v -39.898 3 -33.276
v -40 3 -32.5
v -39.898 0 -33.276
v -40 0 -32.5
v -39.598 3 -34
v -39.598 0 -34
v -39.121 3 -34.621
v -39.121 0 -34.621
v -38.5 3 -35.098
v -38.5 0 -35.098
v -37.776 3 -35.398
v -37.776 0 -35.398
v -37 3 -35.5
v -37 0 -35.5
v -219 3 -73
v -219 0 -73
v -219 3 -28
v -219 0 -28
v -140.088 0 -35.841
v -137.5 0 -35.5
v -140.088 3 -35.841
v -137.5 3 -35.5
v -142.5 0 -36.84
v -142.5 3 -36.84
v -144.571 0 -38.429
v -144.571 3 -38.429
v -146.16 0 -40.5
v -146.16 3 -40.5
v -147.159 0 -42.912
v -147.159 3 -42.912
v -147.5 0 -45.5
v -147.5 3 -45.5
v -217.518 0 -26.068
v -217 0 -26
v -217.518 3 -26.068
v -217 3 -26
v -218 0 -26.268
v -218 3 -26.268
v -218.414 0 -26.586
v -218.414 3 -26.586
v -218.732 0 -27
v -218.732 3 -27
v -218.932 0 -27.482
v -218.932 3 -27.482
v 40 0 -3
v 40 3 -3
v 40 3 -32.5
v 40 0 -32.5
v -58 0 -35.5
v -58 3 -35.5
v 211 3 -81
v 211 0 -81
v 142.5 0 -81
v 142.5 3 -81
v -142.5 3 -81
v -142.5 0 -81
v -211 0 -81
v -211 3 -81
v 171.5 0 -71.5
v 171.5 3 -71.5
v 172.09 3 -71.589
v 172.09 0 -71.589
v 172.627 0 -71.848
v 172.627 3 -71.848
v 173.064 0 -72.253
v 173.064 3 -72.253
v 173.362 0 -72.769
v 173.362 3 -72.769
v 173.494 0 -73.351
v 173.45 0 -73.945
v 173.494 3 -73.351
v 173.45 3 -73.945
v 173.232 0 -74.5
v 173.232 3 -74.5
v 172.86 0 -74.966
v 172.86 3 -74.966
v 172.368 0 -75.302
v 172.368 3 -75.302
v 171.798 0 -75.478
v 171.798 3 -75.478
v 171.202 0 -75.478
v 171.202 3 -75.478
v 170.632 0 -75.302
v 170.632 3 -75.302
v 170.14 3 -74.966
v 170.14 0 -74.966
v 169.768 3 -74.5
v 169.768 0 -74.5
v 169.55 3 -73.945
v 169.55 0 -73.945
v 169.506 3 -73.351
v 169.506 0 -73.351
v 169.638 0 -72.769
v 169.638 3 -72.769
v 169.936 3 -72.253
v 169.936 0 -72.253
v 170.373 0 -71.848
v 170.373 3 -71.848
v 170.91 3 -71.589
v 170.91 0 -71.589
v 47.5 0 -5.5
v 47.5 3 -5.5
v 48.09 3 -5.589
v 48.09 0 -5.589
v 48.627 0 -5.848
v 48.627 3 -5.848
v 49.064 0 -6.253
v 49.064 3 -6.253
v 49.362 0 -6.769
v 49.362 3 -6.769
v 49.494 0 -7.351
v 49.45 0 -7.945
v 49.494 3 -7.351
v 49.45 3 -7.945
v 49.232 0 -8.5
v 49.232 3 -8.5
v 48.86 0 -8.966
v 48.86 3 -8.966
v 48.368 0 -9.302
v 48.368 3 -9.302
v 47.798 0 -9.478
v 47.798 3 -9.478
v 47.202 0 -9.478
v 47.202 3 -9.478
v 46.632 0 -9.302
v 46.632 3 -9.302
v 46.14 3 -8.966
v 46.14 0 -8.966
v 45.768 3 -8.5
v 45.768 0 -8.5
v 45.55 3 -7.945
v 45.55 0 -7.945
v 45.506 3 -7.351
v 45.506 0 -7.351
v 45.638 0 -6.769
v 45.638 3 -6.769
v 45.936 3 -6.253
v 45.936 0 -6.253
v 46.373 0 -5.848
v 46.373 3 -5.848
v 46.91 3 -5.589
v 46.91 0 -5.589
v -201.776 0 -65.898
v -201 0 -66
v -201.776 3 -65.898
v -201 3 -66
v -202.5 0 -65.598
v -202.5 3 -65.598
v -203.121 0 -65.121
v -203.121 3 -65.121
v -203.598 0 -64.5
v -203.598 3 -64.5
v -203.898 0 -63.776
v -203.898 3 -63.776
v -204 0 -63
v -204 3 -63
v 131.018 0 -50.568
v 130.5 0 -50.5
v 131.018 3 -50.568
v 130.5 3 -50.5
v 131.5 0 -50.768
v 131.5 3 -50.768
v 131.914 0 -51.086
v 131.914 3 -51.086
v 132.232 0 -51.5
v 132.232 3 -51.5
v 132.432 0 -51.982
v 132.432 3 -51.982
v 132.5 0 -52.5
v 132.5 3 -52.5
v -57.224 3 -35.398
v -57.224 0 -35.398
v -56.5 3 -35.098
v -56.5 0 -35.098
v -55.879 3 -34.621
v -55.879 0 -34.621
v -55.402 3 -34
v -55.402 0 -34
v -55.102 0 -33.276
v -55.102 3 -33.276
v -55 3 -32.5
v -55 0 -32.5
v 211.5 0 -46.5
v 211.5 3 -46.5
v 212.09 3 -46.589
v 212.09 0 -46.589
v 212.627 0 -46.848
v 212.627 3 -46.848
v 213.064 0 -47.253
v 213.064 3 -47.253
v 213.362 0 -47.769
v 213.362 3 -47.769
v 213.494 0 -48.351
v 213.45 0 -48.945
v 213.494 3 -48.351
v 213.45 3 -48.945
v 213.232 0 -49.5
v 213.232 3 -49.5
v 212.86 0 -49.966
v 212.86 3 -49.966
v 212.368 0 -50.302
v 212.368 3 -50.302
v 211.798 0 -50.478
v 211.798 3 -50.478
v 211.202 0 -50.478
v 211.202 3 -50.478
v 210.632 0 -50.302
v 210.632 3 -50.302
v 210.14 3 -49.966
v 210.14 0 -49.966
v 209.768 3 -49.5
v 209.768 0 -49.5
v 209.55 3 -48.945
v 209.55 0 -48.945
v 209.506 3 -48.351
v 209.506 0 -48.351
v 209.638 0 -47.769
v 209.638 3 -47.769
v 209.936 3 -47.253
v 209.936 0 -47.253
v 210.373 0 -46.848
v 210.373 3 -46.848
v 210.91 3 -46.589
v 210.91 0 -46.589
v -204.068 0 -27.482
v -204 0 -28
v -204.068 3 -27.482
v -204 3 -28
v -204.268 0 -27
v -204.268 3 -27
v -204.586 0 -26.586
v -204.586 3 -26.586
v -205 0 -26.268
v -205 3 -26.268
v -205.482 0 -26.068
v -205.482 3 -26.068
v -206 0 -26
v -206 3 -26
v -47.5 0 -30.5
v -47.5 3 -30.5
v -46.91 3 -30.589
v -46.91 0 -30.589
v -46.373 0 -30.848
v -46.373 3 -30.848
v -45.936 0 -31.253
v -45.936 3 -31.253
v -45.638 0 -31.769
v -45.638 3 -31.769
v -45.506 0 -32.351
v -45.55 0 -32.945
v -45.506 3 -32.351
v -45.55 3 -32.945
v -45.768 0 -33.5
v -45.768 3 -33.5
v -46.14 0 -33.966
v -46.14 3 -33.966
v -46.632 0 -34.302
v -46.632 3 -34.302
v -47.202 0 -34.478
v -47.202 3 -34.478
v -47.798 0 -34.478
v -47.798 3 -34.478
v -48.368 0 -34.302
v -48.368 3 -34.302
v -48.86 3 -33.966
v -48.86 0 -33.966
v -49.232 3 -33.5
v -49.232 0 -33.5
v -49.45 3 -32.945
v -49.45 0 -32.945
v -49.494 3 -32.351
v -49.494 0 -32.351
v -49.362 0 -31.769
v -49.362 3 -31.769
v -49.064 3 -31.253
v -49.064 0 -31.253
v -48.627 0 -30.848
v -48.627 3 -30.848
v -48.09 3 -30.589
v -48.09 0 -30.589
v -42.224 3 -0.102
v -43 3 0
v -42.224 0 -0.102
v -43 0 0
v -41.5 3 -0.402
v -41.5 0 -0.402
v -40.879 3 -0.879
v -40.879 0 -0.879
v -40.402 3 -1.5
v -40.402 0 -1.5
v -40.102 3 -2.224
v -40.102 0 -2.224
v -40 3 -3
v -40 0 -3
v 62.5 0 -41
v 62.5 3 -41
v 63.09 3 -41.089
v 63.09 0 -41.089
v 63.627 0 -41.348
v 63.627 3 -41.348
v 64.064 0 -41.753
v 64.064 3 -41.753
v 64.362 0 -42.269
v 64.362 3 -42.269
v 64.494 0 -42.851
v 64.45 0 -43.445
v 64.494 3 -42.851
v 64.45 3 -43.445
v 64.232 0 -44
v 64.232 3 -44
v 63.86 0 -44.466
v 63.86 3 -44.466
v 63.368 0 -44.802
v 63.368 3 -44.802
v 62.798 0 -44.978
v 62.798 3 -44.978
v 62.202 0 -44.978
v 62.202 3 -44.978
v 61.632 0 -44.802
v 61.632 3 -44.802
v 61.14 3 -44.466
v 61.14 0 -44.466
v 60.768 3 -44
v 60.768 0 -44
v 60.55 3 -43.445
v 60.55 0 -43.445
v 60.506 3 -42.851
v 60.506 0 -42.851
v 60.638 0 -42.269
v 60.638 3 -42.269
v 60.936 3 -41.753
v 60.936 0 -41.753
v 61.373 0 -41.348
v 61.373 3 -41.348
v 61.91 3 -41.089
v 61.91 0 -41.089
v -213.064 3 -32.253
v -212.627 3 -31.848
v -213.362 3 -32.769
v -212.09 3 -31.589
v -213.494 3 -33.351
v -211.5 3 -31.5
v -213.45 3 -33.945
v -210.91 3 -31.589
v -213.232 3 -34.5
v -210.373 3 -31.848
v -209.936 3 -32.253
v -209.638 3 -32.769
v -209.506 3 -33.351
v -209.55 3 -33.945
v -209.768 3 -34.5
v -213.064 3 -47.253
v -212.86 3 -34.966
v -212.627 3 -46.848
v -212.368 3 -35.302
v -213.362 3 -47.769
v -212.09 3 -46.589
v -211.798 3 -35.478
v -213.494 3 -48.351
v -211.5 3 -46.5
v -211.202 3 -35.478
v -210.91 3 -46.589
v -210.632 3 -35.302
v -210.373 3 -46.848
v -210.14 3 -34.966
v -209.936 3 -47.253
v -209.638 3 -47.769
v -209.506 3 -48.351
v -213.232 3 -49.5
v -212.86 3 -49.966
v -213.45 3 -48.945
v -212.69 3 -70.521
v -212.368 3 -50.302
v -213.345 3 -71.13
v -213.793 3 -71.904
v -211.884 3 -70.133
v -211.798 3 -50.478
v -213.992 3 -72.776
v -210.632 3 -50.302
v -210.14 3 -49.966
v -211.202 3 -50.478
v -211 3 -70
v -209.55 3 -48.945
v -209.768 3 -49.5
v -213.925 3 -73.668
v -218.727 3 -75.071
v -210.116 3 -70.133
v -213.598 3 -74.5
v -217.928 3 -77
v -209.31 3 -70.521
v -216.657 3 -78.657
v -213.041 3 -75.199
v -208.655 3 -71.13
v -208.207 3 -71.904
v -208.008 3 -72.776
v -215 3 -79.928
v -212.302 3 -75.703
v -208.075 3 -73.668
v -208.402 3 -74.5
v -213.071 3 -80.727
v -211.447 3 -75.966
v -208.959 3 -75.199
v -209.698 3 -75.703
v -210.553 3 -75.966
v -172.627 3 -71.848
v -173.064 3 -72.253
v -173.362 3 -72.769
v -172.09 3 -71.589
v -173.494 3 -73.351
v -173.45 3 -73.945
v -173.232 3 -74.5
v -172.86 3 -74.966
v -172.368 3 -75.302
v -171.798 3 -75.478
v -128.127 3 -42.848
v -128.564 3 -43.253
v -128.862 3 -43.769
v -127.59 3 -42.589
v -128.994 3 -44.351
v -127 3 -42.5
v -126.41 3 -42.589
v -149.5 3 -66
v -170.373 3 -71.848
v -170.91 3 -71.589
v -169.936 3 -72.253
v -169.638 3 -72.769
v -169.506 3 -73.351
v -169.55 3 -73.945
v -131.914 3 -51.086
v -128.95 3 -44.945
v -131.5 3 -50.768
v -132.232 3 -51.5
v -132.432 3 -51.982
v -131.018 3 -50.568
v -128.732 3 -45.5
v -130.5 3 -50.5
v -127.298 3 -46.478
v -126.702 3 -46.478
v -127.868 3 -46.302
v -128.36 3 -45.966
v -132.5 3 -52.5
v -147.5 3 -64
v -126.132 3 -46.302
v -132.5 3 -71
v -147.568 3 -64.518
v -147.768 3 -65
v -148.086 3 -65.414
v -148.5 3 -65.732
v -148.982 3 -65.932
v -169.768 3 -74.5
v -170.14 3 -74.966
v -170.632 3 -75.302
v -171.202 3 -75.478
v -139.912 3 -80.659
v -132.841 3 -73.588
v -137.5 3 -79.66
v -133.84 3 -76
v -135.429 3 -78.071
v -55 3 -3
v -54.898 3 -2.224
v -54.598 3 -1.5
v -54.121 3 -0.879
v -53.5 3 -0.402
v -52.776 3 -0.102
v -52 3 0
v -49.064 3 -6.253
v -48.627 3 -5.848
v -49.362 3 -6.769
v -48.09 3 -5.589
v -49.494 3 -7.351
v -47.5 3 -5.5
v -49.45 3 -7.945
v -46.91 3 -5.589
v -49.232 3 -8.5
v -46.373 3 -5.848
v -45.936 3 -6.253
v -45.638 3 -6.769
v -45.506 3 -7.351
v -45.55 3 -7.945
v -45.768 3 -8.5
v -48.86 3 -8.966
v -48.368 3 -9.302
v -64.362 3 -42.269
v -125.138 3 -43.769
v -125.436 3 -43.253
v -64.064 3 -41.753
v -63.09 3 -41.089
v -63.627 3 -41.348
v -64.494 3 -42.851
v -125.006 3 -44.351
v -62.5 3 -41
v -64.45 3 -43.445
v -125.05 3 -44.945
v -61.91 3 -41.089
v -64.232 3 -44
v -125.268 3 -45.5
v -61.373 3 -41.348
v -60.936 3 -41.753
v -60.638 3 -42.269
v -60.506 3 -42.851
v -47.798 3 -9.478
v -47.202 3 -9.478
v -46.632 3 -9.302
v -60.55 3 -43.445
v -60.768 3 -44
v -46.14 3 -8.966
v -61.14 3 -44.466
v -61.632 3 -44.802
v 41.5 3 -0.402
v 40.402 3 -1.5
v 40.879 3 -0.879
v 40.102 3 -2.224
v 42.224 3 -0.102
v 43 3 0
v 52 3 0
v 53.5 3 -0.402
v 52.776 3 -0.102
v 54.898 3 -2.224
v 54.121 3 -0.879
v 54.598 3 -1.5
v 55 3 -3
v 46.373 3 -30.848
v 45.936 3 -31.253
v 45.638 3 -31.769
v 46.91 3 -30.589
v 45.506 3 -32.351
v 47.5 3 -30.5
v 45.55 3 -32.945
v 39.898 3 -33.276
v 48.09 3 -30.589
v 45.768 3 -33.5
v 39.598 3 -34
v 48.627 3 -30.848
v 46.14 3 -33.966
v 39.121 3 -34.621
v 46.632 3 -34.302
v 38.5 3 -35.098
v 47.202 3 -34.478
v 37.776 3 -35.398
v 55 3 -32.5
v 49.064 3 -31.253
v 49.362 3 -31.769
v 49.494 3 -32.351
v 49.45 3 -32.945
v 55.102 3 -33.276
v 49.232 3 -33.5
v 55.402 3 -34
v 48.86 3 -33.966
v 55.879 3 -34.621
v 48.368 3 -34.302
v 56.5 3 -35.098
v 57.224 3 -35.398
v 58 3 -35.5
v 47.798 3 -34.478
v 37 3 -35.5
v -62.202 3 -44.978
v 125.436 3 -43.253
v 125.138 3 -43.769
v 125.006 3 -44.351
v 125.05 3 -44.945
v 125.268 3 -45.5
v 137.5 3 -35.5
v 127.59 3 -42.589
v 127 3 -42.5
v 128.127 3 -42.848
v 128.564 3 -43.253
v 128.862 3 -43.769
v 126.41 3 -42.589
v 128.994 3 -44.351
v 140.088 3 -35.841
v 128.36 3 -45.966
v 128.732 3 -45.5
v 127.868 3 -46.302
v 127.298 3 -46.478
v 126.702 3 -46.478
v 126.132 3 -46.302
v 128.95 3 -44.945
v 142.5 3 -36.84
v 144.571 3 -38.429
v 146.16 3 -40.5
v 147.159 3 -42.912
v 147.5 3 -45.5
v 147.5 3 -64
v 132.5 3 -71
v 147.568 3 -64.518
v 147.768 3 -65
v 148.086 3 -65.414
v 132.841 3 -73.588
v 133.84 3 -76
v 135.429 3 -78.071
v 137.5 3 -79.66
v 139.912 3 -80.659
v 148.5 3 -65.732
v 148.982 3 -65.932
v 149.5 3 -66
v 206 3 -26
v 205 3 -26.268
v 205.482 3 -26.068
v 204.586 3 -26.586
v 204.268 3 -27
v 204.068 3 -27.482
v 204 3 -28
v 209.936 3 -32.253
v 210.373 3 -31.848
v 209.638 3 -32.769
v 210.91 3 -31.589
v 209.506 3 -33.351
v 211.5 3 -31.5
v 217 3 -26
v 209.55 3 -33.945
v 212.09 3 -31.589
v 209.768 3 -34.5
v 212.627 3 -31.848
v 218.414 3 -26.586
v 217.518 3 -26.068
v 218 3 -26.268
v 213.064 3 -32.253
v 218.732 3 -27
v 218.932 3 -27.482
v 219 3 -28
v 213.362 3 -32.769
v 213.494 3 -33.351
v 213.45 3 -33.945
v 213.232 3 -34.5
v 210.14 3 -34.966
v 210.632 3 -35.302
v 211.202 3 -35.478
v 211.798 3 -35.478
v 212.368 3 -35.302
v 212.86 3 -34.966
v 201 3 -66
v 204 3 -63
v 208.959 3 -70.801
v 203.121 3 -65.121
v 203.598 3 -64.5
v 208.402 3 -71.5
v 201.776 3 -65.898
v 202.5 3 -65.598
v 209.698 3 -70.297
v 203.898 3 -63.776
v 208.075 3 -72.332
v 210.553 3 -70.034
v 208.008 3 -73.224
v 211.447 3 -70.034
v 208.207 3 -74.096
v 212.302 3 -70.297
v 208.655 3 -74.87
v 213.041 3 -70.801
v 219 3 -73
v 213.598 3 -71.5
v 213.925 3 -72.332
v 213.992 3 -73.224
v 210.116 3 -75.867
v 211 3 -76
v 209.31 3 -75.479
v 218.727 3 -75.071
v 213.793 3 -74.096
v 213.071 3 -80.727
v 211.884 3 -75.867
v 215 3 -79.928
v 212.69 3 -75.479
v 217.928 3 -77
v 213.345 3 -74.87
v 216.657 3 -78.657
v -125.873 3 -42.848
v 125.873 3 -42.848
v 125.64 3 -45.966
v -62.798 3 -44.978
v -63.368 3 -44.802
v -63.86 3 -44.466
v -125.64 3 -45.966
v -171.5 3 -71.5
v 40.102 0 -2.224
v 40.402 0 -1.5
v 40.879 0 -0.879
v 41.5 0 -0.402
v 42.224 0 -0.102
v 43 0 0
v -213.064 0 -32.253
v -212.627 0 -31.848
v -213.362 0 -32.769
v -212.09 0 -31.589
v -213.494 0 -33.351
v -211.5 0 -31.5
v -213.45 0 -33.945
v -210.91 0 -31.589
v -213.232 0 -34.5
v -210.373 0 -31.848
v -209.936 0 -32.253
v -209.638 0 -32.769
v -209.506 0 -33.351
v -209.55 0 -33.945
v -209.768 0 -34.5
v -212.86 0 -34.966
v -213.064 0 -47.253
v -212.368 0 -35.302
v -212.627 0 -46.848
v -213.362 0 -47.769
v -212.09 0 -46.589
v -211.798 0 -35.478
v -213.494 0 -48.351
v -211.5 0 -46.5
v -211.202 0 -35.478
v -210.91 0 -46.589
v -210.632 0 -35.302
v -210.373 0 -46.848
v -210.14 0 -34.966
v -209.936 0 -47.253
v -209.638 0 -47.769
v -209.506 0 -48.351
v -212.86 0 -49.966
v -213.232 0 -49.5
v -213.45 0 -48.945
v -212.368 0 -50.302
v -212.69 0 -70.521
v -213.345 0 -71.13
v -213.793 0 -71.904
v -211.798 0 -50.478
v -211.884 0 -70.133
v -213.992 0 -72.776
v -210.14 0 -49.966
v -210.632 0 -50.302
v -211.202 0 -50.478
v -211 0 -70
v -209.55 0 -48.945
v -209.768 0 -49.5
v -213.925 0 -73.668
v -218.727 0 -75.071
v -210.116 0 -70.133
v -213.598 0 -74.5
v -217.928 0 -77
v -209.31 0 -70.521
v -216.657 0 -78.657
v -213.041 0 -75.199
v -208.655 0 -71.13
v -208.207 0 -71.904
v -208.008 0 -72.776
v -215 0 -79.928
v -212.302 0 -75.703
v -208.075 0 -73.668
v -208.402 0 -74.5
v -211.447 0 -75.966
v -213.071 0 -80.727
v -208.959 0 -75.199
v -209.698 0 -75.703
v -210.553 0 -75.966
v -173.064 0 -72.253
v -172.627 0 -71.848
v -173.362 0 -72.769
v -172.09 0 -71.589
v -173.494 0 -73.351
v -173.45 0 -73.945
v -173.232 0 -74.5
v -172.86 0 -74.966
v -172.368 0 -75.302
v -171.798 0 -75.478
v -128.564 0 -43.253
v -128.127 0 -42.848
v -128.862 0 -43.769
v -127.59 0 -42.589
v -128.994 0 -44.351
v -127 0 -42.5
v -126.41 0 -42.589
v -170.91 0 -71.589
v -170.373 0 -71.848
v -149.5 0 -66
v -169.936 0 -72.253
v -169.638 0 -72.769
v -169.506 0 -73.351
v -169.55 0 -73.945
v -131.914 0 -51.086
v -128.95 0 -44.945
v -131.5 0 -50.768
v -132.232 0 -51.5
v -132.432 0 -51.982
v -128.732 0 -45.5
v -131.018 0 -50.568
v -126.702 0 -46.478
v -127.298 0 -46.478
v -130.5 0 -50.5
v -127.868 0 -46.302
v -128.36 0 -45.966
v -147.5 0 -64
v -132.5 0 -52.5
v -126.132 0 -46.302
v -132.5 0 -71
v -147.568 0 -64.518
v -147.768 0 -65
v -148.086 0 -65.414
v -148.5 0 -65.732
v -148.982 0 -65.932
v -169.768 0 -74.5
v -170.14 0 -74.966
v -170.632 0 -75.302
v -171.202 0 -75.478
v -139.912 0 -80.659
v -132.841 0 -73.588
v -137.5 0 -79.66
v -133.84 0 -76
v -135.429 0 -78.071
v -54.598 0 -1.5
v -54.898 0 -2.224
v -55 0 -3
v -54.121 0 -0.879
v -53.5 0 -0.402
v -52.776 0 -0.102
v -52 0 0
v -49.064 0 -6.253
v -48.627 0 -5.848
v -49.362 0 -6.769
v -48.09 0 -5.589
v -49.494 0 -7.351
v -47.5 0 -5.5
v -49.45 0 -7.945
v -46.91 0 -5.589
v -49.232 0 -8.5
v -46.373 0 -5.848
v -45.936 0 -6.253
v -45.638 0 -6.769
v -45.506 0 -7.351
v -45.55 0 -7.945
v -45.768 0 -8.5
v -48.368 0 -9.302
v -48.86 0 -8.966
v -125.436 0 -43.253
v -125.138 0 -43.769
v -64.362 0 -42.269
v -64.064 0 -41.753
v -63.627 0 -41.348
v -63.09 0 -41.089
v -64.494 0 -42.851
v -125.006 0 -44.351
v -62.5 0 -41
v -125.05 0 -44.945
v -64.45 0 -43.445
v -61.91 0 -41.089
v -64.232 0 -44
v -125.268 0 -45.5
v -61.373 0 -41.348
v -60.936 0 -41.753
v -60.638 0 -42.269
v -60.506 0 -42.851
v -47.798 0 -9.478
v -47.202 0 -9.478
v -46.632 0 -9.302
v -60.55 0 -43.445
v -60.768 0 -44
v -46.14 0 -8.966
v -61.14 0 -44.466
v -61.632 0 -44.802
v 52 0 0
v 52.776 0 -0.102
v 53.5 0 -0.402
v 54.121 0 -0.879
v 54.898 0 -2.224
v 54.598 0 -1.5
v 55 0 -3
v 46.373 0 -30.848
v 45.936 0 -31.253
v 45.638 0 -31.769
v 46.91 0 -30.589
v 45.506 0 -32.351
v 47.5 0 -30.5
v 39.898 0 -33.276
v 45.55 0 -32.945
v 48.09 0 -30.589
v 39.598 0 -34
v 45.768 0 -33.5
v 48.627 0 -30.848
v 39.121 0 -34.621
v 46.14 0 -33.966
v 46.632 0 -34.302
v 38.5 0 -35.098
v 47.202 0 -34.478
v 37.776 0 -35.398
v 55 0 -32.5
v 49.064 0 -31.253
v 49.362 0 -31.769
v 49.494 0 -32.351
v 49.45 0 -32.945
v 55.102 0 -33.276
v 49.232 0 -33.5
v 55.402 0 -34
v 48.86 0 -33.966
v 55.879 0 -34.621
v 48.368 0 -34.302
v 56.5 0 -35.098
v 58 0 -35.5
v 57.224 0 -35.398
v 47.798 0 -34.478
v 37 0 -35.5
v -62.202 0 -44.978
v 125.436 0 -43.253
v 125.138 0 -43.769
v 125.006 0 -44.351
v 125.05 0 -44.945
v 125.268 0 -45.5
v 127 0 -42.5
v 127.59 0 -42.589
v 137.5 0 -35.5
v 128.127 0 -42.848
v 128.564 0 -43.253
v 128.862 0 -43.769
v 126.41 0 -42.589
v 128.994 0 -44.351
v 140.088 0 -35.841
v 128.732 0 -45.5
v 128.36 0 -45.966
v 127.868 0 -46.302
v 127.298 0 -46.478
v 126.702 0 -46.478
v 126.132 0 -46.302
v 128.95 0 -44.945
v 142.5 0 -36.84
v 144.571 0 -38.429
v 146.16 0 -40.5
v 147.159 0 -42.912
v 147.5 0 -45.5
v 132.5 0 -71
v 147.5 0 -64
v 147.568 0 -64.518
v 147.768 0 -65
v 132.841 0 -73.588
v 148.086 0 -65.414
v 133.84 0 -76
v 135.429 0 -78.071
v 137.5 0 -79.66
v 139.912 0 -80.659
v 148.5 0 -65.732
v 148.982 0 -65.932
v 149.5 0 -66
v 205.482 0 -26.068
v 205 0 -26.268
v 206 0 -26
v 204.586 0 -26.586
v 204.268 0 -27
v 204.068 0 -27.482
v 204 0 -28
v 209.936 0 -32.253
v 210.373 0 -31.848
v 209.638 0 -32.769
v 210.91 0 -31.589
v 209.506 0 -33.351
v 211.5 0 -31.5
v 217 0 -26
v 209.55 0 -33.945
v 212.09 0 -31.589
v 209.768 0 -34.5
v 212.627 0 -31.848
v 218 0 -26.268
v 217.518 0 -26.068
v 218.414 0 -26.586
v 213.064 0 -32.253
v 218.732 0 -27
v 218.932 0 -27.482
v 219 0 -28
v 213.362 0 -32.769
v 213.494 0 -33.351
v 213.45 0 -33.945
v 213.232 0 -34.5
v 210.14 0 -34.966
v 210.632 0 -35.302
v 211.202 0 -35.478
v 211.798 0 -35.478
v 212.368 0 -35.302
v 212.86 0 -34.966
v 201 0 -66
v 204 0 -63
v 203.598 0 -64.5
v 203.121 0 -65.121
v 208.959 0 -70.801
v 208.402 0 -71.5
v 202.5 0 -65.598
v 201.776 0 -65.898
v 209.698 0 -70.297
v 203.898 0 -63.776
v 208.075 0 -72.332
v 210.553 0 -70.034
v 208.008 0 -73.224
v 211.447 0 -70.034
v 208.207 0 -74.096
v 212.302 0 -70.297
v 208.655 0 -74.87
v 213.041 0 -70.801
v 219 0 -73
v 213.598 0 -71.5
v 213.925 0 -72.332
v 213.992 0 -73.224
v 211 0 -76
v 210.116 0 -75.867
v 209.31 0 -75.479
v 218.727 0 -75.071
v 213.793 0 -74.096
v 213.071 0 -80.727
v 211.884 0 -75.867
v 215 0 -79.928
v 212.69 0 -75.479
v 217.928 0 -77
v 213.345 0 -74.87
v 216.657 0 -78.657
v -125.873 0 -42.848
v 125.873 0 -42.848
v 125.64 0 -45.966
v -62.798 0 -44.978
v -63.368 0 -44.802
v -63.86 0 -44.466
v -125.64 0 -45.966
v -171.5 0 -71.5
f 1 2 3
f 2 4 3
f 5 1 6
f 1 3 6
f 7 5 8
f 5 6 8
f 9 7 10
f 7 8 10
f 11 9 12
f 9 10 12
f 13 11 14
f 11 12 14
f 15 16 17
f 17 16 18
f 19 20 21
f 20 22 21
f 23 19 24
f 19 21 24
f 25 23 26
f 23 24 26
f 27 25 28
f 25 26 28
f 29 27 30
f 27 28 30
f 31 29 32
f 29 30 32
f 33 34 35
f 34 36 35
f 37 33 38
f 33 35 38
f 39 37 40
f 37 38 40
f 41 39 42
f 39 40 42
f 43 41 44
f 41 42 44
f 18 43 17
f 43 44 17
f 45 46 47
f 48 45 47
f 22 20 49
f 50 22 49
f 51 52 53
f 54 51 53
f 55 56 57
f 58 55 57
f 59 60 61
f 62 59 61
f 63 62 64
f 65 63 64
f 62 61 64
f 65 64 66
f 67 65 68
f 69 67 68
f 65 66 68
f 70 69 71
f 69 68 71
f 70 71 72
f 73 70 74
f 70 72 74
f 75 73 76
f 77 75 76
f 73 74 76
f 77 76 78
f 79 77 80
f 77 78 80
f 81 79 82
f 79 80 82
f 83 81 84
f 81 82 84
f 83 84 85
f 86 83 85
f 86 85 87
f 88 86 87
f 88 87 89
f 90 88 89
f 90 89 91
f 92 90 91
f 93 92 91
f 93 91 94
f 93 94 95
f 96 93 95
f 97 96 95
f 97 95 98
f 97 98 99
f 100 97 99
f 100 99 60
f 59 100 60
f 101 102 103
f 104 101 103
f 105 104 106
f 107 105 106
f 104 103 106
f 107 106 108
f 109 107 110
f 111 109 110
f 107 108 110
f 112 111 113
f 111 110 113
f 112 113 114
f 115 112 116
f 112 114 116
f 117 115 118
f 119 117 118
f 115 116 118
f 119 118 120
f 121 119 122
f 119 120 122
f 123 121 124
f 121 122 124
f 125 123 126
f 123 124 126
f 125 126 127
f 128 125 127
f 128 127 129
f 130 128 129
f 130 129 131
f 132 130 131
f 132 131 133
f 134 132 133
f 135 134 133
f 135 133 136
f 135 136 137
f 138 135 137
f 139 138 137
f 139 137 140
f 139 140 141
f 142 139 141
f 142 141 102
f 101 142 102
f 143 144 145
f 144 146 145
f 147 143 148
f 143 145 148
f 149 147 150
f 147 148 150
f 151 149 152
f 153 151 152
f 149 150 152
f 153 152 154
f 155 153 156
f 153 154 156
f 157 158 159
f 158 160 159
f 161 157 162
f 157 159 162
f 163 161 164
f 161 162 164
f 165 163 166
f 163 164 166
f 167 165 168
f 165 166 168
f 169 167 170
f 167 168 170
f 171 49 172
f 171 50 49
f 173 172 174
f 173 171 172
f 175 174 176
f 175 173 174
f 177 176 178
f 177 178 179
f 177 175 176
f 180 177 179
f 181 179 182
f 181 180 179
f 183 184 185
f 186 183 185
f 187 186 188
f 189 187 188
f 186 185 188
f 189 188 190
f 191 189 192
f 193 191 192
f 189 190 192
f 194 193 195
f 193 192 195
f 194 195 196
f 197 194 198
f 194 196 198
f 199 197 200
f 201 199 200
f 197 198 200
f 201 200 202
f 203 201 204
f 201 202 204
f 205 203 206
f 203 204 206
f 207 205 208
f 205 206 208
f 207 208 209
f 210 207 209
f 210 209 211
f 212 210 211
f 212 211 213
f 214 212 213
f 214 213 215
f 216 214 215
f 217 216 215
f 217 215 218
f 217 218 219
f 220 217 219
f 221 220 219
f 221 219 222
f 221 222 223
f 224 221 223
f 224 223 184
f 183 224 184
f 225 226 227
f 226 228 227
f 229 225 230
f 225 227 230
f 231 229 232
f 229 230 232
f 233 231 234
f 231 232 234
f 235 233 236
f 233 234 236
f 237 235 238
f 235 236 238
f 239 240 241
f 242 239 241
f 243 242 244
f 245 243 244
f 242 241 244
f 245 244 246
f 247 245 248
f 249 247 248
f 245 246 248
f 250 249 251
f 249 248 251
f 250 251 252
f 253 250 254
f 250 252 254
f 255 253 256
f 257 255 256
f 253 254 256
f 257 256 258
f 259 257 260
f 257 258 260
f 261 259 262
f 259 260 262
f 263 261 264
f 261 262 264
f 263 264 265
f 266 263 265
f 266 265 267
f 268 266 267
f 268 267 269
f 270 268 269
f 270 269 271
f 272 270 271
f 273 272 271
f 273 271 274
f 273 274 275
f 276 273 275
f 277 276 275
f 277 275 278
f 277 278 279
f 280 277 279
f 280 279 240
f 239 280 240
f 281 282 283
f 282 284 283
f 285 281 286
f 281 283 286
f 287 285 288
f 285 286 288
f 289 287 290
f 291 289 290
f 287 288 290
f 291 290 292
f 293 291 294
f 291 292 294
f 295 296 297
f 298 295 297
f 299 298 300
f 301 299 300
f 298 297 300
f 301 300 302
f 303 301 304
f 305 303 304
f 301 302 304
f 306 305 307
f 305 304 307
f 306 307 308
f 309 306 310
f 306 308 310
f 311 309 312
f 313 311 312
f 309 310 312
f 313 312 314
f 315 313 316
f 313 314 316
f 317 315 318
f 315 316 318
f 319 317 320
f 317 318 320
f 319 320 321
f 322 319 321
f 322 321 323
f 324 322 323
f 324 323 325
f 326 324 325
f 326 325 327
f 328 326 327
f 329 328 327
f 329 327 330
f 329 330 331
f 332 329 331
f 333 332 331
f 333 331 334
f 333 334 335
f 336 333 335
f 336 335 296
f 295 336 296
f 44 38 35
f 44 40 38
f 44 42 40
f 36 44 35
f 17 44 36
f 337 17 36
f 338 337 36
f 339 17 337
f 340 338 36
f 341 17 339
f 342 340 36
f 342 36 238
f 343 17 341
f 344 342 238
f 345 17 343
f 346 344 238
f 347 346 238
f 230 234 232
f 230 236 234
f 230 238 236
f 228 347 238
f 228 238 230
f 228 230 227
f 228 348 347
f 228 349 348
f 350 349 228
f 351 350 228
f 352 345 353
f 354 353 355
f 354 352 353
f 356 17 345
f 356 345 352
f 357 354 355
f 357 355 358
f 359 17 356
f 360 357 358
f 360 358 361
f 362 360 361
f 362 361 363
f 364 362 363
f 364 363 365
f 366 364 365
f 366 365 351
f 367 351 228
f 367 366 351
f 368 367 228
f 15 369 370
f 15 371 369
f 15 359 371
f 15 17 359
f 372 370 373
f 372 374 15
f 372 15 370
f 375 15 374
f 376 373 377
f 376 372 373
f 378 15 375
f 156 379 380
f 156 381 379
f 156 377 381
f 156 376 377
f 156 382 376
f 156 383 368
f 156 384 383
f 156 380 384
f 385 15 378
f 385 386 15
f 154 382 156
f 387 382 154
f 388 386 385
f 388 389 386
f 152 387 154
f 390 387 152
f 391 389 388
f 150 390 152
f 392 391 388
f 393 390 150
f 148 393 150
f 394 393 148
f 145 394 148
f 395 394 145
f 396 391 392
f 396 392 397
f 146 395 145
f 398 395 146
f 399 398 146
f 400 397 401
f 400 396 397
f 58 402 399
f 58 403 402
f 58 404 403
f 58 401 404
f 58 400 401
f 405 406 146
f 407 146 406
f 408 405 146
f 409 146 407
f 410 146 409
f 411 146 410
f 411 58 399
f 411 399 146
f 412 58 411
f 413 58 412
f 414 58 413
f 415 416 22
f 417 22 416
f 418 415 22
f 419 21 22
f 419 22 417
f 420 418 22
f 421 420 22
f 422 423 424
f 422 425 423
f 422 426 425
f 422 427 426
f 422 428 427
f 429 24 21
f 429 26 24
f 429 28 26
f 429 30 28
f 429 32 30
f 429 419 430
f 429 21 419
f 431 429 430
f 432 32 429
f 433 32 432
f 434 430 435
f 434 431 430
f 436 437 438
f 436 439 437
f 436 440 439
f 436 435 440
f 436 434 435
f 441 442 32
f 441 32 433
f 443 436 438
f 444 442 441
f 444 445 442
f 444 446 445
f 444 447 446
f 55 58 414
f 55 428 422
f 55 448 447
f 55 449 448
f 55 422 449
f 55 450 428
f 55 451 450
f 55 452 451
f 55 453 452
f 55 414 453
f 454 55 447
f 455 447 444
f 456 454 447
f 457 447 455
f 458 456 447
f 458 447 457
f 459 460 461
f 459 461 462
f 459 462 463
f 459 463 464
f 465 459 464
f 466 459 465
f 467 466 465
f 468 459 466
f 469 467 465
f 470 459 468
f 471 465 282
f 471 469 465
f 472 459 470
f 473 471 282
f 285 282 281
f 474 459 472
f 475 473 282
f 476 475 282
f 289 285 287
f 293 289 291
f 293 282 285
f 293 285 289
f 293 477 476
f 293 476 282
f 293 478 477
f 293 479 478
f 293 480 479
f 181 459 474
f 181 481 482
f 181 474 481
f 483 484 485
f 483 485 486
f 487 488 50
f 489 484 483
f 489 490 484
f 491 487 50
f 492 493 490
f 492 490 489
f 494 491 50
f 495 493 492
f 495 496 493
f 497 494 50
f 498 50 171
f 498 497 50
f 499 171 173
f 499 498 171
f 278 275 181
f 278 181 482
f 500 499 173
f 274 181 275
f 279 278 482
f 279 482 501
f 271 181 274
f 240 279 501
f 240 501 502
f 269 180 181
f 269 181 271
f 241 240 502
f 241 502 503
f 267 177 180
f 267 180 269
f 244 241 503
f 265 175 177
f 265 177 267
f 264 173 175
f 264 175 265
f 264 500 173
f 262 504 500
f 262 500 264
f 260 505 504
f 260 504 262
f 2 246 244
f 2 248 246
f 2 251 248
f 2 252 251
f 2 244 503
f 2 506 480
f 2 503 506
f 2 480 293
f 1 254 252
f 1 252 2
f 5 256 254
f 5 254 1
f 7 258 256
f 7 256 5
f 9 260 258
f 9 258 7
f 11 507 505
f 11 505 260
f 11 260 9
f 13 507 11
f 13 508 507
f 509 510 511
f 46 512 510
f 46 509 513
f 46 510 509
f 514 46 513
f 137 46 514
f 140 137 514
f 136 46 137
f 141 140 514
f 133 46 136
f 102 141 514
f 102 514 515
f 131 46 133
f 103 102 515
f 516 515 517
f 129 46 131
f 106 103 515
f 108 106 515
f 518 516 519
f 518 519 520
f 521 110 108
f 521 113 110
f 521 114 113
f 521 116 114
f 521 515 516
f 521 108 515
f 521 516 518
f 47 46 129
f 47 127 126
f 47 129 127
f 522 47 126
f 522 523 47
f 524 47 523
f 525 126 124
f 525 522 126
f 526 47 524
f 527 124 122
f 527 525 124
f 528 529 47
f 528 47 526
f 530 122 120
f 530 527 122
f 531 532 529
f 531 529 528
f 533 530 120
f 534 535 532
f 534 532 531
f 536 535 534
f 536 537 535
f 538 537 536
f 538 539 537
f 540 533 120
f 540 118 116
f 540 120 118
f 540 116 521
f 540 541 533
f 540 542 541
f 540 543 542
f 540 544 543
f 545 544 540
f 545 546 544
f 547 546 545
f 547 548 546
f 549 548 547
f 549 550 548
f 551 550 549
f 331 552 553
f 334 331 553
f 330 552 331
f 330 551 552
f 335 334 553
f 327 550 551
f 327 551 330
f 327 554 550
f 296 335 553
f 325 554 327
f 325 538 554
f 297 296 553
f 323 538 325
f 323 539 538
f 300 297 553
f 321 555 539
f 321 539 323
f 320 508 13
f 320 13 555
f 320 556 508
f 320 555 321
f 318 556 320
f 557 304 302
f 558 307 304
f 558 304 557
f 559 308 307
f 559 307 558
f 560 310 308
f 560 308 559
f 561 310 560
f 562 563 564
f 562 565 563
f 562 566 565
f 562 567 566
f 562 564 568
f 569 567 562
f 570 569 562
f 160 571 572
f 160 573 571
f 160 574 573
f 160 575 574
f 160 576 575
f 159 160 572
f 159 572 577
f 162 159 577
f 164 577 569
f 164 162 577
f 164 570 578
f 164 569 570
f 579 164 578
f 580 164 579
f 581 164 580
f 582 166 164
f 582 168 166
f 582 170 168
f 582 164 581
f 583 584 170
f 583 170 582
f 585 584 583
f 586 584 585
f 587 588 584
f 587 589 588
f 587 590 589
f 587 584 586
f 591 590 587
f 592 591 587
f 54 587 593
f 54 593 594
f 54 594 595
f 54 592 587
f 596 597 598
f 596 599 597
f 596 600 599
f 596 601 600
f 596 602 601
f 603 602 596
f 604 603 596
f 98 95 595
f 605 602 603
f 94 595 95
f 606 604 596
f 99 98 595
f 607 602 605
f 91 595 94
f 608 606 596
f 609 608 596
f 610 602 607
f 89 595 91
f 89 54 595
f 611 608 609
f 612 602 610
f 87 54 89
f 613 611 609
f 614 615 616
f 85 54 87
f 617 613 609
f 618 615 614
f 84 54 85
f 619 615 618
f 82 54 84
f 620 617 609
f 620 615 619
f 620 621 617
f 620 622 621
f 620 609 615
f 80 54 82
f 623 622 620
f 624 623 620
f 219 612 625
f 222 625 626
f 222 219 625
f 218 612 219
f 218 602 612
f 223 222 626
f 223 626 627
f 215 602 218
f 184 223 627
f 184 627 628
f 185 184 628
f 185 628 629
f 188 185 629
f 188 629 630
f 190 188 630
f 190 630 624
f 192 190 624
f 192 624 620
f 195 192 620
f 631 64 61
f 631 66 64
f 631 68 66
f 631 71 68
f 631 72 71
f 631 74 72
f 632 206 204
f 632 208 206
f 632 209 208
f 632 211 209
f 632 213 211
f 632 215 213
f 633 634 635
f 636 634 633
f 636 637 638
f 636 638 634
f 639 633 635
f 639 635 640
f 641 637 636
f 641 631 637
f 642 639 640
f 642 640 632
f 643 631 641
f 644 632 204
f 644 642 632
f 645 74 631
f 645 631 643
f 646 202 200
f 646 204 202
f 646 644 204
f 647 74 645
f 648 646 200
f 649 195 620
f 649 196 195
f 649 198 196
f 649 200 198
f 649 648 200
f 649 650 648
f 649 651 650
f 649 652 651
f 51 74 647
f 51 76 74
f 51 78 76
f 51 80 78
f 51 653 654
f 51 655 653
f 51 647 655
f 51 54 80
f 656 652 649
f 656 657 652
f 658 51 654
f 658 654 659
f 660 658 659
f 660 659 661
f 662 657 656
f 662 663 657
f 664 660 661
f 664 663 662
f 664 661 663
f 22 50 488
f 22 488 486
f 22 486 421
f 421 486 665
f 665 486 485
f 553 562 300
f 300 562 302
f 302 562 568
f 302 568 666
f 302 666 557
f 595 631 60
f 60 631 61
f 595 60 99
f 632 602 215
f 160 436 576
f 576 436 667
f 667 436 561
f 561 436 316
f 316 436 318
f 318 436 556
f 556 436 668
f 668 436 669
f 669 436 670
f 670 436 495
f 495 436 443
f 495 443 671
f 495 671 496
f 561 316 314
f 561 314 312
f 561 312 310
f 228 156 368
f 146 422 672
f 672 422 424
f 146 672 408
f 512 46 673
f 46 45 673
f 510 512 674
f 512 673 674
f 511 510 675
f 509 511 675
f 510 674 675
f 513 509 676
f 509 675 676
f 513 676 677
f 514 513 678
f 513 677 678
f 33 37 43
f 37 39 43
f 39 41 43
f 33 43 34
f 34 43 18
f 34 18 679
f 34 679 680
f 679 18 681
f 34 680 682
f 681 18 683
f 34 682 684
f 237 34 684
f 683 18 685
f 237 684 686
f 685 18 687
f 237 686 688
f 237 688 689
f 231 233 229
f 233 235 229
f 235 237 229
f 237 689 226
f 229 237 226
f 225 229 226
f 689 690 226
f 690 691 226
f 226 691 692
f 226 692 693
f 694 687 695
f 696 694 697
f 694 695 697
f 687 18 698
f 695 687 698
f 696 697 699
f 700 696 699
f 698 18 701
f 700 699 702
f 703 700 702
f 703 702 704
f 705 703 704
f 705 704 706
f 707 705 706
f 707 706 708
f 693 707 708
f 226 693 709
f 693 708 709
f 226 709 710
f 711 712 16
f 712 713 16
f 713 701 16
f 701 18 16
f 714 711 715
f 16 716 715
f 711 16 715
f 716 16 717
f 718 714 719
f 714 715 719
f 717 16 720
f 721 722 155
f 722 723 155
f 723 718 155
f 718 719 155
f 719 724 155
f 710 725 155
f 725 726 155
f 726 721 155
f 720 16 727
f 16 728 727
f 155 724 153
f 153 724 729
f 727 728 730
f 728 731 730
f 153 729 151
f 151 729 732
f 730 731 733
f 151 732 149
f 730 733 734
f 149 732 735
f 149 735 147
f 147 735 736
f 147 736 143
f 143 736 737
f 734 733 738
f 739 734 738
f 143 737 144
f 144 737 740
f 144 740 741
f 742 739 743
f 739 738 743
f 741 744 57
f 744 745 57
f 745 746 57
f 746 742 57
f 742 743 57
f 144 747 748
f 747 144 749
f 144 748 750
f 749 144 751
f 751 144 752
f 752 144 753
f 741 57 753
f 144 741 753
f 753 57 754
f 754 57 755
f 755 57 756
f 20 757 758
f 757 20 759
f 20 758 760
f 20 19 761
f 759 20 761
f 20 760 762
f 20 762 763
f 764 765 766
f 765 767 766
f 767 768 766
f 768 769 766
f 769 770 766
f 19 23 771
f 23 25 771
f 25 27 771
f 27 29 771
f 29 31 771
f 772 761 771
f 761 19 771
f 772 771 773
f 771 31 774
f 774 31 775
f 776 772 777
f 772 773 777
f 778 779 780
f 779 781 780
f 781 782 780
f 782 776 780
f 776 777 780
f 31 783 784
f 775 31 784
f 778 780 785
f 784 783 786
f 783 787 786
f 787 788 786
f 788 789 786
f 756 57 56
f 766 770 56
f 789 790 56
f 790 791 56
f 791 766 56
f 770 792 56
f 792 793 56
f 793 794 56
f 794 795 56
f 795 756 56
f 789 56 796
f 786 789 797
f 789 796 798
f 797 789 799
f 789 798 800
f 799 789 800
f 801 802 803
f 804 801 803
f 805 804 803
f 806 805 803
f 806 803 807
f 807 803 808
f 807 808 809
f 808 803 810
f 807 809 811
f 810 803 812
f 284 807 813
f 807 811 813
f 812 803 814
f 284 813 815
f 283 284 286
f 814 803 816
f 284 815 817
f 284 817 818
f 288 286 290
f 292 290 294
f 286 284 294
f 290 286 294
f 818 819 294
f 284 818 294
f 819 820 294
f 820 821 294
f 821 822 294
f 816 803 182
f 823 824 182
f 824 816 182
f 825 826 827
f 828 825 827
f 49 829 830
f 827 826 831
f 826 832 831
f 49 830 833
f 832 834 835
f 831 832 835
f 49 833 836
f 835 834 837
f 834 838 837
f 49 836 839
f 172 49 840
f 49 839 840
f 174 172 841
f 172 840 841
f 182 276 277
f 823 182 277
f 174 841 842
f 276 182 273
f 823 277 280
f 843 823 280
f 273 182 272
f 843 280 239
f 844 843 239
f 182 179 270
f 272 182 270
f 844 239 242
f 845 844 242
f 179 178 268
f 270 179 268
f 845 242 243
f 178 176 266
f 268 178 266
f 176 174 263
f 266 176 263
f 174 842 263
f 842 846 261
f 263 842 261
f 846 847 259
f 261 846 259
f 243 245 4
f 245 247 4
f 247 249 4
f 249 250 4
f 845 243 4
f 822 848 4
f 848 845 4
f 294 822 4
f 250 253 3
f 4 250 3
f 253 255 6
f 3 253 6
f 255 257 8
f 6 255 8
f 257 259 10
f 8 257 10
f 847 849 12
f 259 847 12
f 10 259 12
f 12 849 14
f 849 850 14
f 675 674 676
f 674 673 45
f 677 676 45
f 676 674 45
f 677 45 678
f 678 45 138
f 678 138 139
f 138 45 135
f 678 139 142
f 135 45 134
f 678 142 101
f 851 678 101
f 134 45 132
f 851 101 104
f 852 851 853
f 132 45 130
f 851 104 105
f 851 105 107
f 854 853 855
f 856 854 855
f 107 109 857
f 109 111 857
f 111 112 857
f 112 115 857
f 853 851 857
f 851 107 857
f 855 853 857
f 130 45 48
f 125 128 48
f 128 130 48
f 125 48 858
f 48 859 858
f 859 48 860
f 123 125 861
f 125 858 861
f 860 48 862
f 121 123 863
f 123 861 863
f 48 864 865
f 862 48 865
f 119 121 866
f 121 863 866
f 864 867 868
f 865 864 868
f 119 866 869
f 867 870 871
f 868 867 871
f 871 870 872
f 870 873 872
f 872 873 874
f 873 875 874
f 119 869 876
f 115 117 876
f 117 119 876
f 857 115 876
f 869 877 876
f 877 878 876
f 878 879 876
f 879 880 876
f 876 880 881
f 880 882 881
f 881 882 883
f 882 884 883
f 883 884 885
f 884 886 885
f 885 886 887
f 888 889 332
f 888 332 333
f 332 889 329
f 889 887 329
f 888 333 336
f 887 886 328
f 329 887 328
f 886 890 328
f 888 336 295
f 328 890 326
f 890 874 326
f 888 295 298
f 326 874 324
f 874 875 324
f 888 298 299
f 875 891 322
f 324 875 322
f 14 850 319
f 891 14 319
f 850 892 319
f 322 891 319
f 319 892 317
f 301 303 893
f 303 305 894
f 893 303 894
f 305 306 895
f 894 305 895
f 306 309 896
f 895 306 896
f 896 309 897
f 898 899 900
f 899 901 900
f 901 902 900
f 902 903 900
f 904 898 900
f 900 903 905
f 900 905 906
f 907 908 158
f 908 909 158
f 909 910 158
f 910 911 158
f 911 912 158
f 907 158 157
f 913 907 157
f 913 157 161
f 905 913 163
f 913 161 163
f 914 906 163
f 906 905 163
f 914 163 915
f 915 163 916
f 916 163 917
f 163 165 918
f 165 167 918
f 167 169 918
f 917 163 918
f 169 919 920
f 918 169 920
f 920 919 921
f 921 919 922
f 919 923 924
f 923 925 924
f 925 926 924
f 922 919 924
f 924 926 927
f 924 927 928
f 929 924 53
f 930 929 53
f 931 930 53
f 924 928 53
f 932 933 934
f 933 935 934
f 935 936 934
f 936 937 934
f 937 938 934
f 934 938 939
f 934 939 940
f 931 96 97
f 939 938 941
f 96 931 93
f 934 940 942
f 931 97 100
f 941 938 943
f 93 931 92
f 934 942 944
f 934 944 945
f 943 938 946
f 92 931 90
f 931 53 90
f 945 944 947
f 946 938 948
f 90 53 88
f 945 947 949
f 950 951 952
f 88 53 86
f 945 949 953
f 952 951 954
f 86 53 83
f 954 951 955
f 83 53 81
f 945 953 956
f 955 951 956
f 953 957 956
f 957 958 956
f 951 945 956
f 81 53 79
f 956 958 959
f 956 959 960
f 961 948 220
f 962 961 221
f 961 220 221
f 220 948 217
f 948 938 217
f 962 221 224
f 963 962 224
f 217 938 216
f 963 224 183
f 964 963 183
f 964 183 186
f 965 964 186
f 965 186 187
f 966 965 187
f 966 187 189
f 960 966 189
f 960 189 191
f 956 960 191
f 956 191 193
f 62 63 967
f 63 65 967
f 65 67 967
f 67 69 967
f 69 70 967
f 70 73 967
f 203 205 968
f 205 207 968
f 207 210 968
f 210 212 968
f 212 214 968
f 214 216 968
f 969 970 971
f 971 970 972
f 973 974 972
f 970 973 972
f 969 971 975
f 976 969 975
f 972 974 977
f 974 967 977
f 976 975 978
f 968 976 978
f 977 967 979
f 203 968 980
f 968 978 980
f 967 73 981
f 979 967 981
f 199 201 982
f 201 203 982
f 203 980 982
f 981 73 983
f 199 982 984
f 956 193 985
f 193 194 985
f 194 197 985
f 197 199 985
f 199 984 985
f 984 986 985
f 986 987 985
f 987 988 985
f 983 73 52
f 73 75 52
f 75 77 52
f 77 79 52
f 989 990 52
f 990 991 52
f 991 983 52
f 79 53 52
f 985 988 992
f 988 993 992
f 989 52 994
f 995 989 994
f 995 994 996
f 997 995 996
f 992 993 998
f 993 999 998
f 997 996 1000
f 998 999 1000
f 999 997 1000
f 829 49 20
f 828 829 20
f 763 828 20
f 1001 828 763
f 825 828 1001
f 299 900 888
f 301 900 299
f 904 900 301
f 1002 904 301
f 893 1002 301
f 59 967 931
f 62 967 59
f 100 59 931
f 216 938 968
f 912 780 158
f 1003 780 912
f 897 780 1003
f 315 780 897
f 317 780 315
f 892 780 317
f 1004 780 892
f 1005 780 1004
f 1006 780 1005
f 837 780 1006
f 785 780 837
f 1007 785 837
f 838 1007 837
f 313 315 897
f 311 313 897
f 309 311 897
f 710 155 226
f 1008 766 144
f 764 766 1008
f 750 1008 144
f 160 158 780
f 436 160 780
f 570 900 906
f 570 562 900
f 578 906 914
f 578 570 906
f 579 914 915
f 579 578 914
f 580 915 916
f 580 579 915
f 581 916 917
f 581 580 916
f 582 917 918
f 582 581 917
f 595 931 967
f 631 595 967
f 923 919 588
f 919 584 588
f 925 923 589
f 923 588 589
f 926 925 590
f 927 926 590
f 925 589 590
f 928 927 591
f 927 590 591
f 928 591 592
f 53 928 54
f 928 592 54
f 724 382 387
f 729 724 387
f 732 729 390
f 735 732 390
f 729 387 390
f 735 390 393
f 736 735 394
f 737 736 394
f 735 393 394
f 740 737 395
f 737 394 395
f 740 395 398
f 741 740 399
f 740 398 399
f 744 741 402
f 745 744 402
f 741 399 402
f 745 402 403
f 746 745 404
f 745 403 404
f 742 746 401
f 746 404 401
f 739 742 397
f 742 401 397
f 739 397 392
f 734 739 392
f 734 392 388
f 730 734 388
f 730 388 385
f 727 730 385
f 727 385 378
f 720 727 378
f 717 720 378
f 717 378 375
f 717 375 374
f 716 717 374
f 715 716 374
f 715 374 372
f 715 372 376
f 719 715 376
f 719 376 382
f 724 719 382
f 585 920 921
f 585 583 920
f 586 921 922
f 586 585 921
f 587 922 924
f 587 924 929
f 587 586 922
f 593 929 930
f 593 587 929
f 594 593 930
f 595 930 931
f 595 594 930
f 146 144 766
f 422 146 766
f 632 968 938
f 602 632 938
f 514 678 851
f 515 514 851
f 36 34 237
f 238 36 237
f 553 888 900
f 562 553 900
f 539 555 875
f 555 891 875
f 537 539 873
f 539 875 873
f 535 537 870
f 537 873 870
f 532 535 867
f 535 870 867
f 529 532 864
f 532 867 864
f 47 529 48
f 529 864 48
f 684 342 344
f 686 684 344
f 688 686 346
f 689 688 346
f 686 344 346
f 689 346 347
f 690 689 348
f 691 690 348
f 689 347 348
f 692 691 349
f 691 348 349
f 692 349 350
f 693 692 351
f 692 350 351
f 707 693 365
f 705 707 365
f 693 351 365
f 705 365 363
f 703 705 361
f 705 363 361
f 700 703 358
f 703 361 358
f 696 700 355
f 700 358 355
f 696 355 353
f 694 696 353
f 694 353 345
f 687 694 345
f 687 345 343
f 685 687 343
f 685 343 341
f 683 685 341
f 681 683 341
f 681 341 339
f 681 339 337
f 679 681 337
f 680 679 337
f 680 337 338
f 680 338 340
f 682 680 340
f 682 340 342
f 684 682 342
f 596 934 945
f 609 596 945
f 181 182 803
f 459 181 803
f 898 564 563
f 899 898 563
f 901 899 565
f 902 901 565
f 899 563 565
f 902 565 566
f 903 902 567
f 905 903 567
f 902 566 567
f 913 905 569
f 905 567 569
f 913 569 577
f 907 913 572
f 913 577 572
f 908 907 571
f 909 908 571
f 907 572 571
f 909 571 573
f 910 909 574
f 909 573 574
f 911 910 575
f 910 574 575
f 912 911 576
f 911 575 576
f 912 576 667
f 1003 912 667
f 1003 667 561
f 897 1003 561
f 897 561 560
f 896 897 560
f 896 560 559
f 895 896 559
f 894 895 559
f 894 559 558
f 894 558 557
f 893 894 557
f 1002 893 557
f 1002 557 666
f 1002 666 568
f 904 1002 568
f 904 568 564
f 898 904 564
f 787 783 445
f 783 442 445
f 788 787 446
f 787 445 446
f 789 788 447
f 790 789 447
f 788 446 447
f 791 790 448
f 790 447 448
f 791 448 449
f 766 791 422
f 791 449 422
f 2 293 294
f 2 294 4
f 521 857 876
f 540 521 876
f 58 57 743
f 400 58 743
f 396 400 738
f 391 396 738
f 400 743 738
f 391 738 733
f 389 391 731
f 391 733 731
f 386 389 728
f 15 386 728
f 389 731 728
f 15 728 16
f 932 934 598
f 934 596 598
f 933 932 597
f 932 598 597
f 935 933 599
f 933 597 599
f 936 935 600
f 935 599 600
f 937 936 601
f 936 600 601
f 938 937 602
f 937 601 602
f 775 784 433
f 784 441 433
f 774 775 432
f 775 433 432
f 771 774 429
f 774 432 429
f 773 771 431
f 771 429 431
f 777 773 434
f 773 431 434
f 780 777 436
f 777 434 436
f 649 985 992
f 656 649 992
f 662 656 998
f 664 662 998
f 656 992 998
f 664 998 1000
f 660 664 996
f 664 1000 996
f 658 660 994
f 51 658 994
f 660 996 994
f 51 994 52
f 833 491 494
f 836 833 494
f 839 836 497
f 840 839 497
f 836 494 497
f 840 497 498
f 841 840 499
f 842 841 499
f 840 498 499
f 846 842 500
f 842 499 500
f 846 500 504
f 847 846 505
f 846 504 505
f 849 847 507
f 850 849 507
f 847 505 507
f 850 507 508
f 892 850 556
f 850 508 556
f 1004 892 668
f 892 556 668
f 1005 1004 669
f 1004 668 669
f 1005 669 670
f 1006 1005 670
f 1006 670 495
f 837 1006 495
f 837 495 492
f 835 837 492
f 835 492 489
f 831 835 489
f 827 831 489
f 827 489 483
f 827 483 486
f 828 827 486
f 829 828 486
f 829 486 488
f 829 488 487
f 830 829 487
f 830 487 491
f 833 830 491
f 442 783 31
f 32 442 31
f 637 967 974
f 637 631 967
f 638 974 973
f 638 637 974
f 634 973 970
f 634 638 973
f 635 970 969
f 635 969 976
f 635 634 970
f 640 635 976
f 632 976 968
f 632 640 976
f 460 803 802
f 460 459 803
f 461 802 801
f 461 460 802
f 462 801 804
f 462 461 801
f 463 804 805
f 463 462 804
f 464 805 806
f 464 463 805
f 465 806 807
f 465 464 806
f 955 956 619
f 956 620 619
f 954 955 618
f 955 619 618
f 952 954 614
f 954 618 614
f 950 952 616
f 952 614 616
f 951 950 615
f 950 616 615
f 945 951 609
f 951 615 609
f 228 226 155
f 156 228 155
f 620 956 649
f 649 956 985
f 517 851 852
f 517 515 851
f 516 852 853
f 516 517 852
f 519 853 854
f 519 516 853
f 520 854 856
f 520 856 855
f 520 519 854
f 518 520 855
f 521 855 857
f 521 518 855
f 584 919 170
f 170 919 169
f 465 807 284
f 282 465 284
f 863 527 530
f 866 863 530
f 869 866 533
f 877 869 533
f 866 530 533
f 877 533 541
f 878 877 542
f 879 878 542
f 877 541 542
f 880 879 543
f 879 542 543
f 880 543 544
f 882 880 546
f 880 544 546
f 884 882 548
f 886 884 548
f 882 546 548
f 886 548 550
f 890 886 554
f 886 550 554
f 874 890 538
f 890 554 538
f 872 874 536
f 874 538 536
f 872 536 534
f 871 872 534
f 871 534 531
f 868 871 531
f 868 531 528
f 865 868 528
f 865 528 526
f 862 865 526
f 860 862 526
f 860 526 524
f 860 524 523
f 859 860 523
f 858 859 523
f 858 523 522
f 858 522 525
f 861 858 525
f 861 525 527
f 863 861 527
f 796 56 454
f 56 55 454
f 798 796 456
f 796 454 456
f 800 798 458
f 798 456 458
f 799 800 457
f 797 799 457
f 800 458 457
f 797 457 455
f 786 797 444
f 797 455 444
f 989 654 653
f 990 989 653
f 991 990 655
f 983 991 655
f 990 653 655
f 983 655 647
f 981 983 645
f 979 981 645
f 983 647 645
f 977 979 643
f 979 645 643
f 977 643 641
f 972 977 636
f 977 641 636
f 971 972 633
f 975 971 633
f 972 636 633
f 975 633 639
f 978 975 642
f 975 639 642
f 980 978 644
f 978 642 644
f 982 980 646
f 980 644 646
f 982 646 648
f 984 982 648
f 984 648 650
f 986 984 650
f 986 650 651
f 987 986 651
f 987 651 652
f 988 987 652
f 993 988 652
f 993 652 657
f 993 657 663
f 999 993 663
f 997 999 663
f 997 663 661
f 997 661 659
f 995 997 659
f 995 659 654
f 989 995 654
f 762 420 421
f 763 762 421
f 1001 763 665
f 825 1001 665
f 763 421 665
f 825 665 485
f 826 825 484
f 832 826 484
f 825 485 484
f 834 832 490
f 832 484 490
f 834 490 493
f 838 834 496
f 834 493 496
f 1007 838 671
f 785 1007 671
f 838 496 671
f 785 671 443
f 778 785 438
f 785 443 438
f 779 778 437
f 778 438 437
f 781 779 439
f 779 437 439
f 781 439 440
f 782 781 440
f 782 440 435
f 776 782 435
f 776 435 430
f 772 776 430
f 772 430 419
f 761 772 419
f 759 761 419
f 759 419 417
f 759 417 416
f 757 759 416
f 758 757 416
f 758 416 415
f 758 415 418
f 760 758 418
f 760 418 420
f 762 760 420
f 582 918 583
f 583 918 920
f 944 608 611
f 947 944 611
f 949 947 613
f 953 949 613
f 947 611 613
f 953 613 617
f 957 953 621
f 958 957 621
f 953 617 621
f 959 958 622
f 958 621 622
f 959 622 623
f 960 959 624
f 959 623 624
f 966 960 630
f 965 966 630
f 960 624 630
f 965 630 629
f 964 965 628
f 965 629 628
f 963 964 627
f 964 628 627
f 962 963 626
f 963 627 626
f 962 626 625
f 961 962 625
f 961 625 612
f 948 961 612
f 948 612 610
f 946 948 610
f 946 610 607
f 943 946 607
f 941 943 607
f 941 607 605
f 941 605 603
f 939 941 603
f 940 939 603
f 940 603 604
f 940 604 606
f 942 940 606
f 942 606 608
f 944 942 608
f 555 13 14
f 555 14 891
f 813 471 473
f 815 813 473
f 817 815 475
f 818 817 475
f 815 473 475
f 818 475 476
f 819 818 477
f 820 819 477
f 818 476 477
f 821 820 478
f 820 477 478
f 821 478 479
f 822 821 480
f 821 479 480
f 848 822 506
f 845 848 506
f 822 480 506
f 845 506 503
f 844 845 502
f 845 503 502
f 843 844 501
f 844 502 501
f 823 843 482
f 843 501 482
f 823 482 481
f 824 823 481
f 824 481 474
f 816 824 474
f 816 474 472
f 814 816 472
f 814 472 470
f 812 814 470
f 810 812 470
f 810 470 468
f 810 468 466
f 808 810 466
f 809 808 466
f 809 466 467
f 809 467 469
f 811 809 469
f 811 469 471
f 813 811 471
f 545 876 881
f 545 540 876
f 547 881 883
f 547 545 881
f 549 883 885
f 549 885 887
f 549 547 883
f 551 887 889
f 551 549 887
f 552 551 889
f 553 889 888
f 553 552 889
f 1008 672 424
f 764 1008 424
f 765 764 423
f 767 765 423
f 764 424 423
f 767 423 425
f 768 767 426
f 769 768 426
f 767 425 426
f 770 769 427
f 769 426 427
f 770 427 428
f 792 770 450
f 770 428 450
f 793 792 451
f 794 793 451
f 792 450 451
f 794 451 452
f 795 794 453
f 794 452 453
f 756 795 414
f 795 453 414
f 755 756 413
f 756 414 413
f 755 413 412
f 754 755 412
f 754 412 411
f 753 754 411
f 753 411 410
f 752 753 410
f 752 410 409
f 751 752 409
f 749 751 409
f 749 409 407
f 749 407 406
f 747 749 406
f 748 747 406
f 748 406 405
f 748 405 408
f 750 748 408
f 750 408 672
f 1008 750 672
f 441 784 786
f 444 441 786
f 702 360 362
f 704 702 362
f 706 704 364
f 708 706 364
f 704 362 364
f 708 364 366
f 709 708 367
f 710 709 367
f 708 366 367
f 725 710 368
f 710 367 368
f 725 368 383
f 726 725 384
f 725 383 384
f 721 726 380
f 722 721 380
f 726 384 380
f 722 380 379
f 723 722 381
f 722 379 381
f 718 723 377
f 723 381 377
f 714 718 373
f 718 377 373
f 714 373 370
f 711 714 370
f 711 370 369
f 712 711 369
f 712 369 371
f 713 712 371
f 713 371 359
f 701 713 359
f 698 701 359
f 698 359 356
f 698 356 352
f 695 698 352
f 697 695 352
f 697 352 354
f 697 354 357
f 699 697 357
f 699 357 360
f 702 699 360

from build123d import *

# Parameters (mm, degrees)
EXTRUDE_1_DEPTH     = 3
SKETCH_2_R          = 2
SKETCH_2_W          = 80
SKETCH_2_H          = 35.5
CUT_EXTRUDE_1_DEPTH = 10
SKETCH_5_R          = 3
CUT_EXTRUDE_4_DEPTH = 234.518735865
FILLET_1_R          = 10
FILLET_2_R          = 3
FILLET_3_R          = 2


with BuildPart() as part:
    # 草图1 → 凸台-拉伸1 (new body)
    with BuildSketch(Plane(origin=(0, 0, 0), x_dir=(1, 0, 0), z_dir=(0, 1, 0))):
        with BuildLine():
            Line((-55, 0), (55, 0))
            Line((55, 0), (55, 35.5))
            Line((55, 35.5), (147.5, 35.5))
            Line((147.5, 35.5), (147.5, 66))
            Line((147.5, 66), (204, 66))
            Line((204, 66), (204, 26))
            Line((204, 26), (219, 26))
            Line((219, 26), (219, 73))
            ThreePointArc((219, 73), (216.656854249, 78.656854249), (211, 81))
            Line((211, 81), (132.5, 81))
            Line((132.5, 81), (132.5, 50.5))
            Line((132.5, 50.5), (-132.5, 50.5))
            Line((-132.5, 50.5), (-132.5, 81))
            Line((-132.5, 81), (-211, 81))
            ThreePointArc((-211, 81), (-216.656854249, 78.656854249), (-219, 73))
            Line((-219, 73), (-219, 26))
            Line((-219, 26), (-204, 26))
            Line((-204, 26), (-204, 66))
            Line((-204, 66), (-147.5, 66))
            Line((-147.5, 66), (-147.5, 35.5))
            Line((-147.5, 35.5), (-55, 35.5))
            Line((-55, 35.5), (-55, 0))
        make_face()
    extrude(amount=EXTRUDE_1_DEPTH)

    # 草图2 → 切除-拉伸1 (cut)
    with BuildSketch(Plane(origin=(0, 3, 0), x_dir=(1, 0, 0), z_dir=(0, 1, 0))):
        with Locations(Location((-47.5, 32.5, 0), (0, 0, 270))):
            Circle(SKETCH_2_R)
        with Locations(Location((-211.5, 33.5, 0), (0, 0, 270))):
            Circle(SKETCH_2_R)
        with Locations(Location((-211.5, 48.5, 0), (0, 0, 270))):
            Circle(SKETCH_2_R)
        with Locations(Location((211.5, 48.5, 0), (0, 0, 270))):
            Circle(SKETCH_2_R)
        with Locations(Location((211.5, 33.5, 0), (0, 0, 270))):
            Circle(SKETCH_2_R)
        with Locations(Location((-171.5, 73.5, 0), (0, 0, 270))):
            Circle(SKETCH_2_R)
        with Locations(Location((171.5, 73.5, 0), (0, 0, 270))):
            Circle(SKETCH_2_R)
        with Locations(Location((47.5, 32.5, 0), (0, 0, 270))):
            Circle(SKETCH_2_R)
        with Locations(Location((-47.5, 7.5, 0), (0, 0, 270))):
            Circle(SKETCH_2_R)
        with Locations(Location((-62.5, 43, 0), (0, 0, 270))):
            Circle(SKETCH_2_R)
        with Locations(Location((-126.999999701, 44.500000154, 0), (0, 0, 270))):
            Circle(SKETCH_2_R)
        with Locations(Location((62.5, 43, 0), (0, 0, 270))):
            Circle(SKETCH_2_R)
        with Locations(Location((126.999999701, 44.500000154, 0), (0, 0, 270))):
            Circle(SKETCH_2_R)
        with Locations(Location((47.5, 7.5, 0), (0, 0, 270))):
            Circle(SKETCH_2_R)
        with Locations((0, 17.75)):
            Rectangle(SKETCH_2_W, SKETCH_2_H)
    extrude(amount=-CUT_EXTRUDE_1_DEPTH, mode=Mode.SUBTRACT)

    # 草图5 → 切除-拉伸4 (cut, through all)
    with BuildSketch(Plane(origin=(0, 3, 0), x_dir=(1, 0, 0), z_dir=(0, 1, 0))):
        with Locations(Location((-211, 73, 0), (0, 0, 270))):
            Circle(SKETCH_5_R)
        with Locations(Location((211, 73, 0), (0, 0, 90))):
            Circle(SKETCH_5_R)
    extrude(amount=-CUT_EXTRUDE_4_DEPTH, mode=Mode.SUBTRACT)

    # 圆角1
    fillet_1_edges = [part.edges().sort_by_distance(p)[0] for p in [
        (-147.5, 1.5, -35.5),
        (-132.5, 1.5, -81),
        (132.5, 1.5, -81),
        (147.5, 1.5, -35.5),
    ]]
    fillet(fillet_1_edges, radius=FILLET_1_R)

    # 圆角2
    fillet_2_edges = [part.edges().sort_by_distance(p)[0] for p in [
        (55, 1.5, 0),
        (-55, 1.5, 0),
        (-55, 1.5, -35.5),
        (-204, 1.5, -66),
        (204, 1.5, -66),
        (55, 1.5, -35.5),
        (-40, 1.5, 0),
        (-40, 1.5, -35.5),
        (40, 1.5, -35.5),
        (40, 1.5, 0),
    ]]
    fillet(fillet_2_edges, radius=FILLET_2_R)

    # 圆角3
    fillet_3_edges = [part.edges().sort_by_distance(p)[0] for p in [
        (-147.5, 1.5, -66),
        (-204, 1.5, -26),
        (-219, 1.5, -26),
        (-132.5, 1.5, -50.5),
        (132.5, 1.5, -50.5),
        (219, 1.5, -26),
        (204, 1.5, -26),
        (147.5, 1.5, -66),
    ]]
    fillet(fillet_3_edges, radius=FILLET_3_R)


solid = part.part
